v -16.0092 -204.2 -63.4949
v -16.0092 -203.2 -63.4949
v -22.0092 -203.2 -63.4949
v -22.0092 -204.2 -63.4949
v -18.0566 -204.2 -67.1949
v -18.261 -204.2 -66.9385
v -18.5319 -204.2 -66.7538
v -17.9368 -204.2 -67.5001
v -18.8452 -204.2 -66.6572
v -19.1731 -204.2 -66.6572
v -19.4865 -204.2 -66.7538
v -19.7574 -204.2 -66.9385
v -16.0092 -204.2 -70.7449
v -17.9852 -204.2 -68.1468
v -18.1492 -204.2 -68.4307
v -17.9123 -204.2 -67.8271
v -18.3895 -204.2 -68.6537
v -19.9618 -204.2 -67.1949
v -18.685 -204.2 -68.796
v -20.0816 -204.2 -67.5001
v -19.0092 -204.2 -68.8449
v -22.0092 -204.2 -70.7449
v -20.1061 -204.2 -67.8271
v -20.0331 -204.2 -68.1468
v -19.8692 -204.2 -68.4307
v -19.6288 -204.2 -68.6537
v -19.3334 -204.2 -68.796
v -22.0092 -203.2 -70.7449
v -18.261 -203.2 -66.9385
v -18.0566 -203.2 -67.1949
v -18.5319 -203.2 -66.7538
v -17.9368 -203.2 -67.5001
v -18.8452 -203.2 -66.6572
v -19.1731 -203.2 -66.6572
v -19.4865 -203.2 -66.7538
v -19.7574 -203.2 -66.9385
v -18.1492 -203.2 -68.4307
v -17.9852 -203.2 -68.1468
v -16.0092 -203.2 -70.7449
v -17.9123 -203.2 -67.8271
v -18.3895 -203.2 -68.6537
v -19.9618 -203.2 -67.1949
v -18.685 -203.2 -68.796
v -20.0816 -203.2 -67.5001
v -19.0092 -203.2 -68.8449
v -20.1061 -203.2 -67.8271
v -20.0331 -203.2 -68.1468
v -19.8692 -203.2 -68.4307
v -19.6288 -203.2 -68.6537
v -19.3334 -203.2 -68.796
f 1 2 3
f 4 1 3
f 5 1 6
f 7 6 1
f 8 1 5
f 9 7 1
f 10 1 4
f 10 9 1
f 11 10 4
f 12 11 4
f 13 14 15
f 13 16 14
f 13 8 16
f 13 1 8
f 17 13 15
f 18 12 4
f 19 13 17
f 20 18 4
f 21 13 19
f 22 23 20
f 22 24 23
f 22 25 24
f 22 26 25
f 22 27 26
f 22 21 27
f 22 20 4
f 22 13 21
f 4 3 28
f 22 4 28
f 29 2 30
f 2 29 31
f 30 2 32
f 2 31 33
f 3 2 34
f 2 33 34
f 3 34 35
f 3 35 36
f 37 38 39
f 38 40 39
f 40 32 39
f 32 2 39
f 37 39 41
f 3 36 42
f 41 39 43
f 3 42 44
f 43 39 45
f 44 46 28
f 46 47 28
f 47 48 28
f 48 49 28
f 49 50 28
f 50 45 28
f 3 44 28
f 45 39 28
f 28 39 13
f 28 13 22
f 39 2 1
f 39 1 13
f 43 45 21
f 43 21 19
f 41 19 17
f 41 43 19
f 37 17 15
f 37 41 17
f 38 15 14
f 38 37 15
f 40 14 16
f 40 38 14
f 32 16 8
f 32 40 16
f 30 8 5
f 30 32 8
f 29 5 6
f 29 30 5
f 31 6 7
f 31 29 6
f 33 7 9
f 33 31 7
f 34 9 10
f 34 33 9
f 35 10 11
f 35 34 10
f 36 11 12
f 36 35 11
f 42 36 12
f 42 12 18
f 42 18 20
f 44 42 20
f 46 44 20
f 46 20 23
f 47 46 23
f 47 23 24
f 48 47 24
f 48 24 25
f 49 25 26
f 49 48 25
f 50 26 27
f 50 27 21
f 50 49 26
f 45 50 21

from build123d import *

# Parameters (mm, degrees)
MAIN_PROFILE_SKETCH_W = 6
MAIN_PROFILE_SKETCH_H = 7.25
MAIN_PROFILE_SKETCH_R = 1.1
MAIN_EXTRUSION_DEPTH  = 1


with BuildPart() as part:
    # Main Profile Sketch → Main Extrusion (new body)
    with BuildSketch(Plane(origin=(0, -203.2, 0), x_dir=(-1, 0, 0), z_dir=(0, -1, 0))):
        with Locations((19.009182883, 67.119882879)):
            Rectangle(MAIN_PROFILE_SKETCH_W, MAIN_PROFILE_SKETCH_H)
        with Locations(Location((19.009182883, 67.744882879, 0), (0, 0, 90))):
            Circle(MAIN_PROFILE_SKETCH_R, mode=Mode.SUBTRACT)
    extrude(amount=MAIN_EXTRUSION_DEPTH)


solid = part.part
